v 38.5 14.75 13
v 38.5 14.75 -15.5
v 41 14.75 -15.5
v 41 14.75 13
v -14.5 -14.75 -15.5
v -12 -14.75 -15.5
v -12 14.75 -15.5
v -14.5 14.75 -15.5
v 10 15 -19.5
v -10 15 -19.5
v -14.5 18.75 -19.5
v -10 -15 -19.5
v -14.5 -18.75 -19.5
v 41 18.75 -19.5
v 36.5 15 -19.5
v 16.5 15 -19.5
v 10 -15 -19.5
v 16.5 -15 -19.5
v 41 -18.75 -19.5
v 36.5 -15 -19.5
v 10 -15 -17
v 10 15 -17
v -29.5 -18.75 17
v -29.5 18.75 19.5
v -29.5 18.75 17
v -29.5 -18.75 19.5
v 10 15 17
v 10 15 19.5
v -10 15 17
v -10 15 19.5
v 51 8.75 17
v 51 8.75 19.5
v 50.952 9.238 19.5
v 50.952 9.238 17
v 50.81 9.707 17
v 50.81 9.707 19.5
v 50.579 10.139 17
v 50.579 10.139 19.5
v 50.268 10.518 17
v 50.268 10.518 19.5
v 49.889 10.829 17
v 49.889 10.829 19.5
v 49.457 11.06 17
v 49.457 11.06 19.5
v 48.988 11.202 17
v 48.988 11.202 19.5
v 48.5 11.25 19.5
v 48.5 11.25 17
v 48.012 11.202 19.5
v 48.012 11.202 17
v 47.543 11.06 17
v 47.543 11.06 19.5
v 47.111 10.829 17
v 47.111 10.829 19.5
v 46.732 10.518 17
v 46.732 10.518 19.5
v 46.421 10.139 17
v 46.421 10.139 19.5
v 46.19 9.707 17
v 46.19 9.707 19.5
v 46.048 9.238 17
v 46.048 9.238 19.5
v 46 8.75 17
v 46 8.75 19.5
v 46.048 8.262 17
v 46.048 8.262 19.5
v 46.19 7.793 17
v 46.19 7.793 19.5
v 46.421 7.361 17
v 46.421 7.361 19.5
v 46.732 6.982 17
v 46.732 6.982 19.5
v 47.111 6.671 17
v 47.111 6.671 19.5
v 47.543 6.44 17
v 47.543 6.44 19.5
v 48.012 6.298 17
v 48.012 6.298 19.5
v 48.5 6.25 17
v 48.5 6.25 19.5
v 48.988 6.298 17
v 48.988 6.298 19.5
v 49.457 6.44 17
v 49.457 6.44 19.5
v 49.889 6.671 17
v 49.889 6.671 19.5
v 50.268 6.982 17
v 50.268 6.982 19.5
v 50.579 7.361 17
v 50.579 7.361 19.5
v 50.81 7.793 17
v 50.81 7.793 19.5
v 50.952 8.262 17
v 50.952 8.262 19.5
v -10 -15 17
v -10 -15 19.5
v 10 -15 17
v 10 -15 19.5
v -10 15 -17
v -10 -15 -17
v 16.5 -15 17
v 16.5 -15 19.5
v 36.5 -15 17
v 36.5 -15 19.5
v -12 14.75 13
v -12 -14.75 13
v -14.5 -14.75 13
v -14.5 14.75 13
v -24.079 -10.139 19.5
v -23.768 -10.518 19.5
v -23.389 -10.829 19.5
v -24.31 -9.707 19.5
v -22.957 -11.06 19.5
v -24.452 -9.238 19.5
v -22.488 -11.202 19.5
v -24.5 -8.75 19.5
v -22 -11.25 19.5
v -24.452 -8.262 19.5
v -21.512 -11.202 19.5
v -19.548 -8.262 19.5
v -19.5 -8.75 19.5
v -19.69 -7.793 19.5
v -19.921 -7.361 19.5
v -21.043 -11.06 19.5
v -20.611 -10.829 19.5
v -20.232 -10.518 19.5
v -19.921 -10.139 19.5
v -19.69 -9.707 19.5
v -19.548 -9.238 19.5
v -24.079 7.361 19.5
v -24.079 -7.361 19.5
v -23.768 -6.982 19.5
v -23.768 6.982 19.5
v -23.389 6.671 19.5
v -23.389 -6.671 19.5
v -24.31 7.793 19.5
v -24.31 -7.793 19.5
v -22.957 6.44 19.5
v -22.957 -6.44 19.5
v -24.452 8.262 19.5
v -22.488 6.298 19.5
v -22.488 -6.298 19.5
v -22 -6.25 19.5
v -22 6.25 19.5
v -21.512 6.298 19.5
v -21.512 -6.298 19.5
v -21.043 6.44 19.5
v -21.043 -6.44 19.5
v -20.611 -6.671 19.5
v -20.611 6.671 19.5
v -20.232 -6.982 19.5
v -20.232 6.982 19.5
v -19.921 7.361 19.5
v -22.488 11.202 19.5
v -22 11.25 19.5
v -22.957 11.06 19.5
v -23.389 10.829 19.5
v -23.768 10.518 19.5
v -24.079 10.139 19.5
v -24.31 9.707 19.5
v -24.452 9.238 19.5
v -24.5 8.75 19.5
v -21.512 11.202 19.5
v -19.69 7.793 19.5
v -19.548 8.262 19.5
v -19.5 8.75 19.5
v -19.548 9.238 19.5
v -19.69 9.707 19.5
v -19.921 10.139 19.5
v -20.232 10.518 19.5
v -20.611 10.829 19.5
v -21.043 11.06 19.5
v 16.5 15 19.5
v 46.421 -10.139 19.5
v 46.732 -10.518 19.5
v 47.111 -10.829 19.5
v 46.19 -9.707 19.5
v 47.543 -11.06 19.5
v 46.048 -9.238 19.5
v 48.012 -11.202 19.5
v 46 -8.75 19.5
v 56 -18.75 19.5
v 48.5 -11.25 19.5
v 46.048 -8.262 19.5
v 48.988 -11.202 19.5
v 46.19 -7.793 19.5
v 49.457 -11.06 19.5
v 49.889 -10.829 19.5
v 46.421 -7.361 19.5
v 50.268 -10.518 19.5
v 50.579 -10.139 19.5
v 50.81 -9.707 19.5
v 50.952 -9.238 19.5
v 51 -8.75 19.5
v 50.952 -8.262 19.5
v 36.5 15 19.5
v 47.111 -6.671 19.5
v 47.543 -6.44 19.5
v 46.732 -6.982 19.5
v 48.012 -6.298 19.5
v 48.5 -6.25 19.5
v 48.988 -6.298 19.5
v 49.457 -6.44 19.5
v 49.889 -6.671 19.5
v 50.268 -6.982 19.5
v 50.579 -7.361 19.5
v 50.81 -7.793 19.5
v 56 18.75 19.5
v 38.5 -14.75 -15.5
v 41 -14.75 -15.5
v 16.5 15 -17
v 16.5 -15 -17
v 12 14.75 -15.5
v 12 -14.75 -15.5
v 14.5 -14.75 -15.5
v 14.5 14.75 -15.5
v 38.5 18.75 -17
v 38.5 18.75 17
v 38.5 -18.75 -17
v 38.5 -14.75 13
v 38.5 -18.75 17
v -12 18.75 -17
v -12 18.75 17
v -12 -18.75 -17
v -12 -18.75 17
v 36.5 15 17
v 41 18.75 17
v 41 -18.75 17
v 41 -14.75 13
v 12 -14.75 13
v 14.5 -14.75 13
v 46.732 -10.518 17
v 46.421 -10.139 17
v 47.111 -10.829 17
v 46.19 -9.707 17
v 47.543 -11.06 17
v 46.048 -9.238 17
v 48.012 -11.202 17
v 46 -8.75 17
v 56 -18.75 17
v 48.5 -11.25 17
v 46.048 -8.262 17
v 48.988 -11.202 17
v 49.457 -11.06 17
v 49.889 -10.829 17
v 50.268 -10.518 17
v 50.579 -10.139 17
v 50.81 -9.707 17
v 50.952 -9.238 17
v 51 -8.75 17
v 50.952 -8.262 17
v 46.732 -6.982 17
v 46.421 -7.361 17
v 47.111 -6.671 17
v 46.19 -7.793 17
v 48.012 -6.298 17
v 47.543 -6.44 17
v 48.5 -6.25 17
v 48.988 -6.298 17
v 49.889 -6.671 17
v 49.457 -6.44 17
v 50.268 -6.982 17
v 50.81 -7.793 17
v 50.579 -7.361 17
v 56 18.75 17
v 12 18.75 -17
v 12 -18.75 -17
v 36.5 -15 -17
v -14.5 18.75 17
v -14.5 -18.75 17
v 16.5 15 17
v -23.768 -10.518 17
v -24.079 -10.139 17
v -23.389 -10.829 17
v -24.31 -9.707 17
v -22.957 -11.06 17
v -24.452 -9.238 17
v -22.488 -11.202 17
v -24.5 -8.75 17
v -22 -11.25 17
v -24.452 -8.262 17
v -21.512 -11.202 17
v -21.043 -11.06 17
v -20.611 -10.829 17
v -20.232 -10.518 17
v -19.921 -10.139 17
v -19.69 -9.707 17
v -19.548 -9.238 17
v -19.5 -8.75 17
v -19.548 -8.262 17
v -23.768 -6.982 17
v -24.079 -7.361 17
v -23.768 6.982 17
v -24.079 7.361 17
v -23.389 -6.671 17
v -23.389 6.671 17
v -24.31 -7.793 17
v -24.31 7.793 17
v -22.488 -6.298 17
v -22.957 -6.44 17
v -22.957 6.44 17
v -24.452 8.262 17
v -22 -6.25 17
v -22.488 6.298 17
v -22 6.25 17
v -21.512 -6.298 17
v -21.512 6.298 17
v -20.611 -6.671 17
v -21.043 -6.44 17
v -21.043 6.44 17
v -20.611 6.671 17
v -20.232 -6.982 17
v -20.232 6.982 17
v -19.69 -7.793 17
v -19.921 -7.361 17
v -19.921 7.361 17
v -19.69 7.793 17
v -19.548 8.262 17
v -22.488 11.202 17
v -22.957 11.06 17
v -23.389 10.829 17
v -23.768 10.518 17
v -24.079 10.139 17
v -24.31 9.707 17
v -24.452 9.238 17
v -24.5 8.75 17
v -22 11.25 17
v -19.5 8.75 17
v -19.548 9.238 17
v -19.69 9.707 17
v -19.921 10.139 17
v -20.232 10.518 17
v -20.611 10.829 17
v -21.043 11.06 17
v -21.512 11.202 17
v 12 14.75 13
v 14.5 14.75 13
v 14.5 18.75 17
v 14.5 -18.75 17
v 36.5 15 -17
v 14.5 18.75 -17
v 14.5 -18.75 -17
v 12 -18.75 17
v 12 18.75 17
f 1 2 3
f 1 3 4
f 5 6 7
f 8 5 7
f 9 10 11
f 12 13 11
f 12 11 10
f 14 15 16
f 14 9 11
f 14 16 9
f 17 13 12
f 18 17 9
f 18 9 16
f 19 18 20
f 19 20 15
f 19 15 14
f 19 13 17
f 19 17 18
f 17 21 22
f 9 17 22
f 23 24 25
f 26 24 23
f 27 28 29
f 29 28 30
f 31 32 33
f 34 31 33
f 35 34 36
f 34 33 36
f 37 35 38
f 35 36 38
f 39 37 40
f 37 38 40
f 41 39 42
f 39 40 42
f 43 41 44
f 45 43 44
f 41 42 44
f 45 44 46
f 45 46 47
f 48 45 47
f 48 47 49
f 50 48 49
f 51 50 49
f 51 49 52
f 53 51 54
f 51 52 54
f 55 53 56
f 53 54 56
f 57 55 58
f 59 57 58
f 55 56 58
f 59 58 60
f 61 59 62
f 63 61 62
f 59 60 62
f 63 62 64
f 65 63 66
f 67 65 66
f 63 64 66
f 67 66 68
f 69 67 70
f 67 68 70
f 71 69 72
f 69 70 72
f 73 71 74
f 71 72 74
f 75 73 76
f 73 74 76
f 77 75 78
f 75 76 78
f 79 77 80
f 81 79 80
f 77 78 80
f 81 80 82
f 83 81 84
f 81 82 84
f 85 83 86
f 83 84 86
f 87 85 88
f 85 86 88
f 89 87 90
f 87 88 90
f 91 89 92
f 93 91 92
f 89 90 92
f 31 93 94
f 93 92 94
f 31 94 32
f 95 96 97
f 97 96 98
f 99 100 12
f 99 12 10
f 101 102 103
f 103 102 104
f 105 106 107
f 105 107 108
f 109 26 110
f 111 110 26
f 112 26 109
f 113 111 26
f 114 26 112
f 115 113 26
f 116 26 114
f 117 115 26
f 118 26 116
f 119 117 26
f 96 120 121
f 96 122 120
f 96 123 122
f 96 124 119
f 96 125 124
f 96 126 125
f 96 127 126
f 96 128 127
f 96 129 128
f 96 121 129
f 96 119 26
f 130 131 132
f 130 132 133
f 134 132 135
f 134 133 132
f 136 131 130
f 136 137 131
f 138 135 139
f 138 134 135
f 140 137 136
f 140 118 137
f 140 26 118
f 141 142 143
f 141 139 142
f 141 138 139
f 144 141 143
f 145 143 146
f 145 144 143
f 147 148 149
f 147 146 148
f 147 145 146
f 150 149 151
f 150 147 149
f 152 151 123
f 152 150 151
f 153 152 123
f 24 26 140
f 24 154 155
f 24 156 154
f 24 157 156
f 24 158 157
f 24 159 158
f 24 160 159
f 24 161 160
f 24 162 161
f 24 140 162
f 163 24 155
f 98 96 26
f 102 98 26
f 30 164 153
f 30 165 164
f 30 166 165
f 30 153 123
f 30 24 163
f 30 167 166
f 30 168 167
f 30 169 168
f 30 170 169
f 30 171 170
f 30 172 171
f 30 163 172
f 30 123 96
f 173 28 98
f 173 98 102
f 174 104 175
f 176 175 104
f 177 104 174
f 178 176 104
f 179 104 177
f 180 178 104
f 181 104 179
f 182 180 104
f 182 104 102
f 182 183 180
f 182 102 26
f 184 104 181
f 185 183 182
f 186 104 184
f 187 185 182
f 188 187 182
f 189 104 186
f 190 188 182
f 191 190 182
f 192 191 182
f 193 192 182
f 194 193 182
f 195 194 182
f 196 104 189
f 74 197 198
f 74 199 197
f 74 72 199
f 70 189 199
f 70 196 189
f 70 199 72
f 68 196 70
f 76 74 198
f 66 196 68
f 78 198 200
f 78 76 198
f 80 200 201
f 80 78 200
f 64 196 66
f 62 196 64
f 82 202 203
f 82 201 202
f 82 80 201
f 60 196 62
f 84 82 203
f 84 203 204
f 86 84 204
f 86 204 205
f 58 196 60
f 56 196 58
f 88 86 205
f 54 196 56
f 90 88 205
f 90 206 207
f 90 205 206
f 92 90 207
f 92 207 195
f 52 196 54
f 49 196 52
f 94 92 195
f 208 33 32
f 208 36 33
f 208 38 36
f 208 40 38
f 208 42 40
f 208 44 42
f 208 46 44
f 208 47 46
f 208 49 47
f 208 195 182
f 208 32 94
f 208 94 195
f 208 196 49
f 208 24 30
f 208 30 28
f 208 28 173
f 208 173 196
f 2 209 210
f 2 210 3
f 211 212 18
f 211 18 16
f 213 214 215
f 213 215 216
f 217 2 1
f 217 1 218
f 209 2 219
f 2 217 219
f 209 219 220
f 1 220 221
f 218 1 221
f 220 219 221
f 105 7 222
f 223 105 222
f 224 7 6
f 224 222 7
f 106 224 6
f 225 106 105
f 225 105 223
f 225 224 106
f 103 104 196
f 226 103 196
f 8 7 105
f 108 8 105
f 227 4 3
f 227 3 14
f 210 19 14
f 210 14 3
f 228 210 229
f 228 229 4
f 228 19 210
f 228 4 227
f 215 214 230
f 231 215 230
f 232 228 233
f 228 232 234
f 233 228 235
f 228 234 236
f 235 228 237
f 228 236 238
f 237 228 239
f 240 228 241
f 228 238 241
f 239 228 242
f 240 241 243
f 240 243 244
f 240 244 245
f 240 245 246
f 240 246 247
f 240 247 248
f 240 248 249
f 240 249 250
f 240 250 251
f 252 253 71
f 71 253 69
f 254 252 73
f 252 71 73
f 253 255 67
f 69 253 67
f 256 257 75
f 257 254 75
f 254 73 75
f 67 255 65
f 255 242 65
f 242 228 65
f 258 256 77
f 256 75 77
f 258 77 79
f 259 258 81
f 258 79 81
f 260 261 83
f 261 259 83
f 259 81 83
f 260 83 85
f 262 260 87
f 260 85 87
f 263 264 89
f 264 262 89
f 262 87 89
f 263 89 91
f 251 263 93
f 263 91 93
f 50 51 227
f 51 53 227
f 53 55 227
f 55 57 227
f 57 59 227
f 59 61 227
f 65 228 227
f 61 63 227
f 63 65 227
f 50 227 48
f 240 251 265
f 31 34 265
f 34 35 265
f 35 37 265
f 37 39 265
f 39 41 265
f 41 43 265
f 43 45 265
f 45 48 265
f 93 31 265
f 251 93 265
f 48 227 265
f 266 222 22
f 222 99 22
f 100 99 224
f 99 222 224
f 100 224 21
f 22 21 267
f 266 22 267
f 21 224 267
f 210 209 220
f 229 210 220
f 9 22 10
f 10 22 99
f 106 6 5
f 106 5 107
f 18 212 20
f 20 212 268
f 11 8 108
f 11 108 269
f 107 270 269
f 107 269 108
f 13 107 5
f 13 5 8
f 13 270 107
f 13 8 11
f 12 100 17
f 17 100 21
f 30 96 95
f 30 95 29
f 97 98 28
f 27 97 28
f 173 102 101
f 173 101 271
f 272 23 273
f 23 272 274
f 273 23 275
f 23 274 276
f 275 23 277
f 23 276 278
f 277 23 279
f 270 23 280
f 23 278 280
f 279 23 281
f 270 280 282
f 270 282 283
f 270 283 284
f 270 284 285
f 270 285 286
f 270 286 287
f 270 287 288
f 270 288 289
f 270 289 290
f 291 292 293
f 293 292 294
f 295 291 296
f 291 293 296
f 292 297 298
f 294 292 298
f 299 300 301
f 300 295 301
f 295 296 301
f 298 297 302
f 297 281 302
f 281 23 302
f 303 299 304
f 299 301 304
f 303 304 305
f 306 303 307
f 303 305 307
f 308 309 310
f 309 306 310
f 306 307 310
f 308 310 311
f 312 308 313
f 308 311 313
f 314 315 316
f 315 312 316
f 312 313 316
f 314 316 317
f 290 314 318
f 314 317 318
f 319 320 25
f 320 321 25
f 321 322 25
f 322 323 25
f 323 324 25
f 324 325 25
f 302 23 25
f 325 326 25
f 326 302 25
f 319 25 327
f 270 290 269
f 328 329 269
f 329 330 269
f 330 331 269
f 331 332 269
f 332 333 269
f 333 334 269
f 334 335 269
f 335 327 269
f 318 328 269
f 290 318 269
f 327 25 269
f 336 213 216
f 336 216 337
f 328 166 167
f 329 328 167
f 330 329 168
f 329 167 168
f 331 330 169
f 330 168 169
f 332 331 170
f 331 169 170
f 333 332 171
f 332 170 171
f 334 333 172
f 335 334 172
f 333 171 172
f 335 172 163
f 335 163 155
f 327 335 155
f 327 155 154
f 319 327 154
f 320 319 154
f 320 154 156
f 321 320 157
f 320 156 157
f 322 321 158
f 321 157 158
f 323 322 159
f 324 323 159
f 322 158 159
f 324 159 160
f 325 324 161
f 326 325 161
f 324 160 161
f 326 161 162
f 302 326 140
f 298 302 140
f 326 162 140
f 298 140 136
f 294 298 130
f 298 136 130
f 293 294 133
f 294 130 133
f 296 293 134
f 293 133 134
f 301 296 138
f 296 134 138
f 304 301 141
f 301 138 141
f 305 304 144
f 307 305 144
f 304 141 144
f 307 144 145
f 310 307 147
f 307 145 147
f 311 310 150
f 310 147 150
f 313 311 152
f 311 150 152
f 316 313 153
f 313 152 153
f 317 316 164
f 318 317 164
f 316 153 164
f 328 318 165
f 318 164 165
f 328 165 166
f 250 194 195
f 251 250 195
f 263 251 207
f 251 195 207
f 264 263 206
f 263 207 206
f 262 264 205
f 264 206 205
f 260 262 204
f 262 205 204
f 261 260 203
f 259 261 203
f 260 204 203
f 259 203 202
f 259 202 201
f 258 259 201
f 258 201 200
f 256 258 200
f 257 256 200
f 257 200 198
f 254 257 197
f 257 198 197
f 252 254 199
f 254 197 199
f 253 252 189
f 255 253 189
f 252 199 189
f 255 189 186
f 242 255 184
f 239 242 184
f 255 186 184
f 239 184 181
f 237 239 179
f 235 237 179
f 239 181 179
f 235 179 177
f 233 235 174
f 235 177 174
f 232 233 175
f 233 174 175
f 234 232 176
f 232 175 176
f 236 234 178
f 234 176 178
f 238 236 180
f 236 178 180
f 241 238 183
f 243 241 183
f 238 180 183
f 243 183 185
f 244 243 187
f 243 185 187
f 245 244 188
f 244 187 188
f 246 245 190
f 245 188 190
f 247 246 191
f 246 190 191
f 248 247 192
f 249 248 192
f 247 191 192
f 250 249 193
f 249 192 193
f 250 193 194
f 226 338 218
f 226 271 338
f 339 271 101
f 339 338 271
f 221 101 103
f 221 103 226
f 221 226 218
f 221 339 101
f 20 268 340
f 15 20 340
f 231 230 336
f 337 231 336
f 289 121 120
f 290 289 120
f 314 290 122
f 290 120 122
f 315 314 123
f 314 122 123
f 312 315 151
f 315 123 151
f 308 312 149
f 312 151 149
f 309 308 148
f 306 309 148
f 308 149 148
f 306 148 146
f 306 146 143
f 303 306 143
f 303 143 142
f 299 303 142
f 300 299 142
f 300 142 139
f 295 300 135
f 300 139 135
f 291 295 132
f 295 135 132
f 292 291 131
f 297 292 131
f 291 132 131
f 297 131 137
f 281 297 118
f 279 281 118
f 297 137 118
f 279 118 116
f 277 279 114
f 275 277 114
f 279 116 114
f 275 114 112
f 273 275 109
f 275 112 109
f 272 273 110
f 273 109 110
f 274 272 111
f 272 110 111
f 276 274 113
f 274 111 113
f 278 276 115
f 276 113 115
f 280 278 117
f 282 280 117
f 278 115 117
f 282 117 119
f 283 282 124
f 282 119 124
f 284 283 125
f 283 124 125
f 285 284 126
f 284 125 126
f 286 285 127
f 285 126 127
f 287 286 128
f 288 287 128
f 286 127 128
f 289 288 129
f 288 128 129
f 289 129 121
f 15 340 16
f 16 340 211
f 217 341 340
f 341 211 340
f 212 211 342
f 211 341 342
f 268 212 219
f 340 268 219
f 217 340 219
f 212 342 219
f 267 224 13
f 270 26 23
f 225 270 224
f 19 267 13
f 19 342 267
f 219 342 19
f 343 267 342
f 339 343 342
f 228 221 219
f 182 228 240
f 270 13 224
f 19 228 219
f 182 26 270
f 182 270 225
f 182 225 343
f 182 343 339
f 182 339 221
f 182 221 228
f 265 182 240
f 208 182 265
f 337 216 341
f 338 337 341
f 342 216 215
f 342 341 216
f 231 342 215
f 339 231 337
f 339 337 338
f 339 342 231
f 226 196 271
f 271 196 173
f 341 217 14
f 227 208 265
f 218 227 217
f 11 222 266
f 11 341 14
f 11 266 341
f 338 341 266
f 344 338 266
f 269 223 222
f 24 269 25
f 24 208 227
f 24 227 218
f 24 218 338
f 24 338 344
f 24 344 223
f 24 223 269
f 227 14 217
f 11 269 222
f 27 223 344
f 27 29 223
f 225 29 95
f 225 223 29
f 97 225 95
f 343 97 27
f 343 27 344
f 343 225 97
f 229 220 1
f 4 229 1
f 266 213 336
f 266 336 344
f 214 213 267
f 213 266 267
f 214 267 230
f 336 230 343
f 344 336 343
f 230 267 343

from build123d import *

# Parameters (mm, degrees)
F0_W          = 24
F0_H          = 34
F1_DEPTH      = 18.75
F1_DEPTH_BACK = 18.75
F2_R          = 2.5
F3_DEPTH      = 2.5
F2_W          = 6.75
F2_H          = 30
F2_W_2        = 13.25
F4_DEPTH      = 60
F5_W          = 29.5
F5_H          = 28.5
F6_DEPTH      = 76.15809
F6_DEPTH_BACK = 25


with BuildPart() as f1:
    # F0 (on Front) → F1 (new body, two sides)
    with BuildSketch(Plane.XZ) as f1_sk:
        Polygon((14.5, 19.5), (-14.5, 19.5), (-14.5, -19.5), (14.5, -19.5), (41, -19.5), (41, -17), (41, 17), (41, 19.5), align=None)
        Rectangle(F0_W, F0_H, mode=Mode.SUBTRACT)
        with Locations((26.5, 0)):
            Rectangle(F0_W, F0_H, mode=Mode.SUBTRACT)
    extrude(amount=F1_DEPTH)
    extrude(f1_sk.sketch, amount=-F1_DEPTH_BACK)

    # F2 (on face) → F3 (join)
    with BuildSketch(Plane.XY.offset(19.5)):
        Polygon((-29.5, 18.75), (-29.5, -18.75), (56, -18.75), (56, 18.75), (-14.5, 18.75), align=None)
        with Locations((-22, -8.75)):
            Circle(F2_R, mode=Mode.SUBTRACT)
        with Locations((48.5, -8.75)):
            Circle(F2_R, mode=Mode.SUBTRACT)
        with Locations((-22, 8.75)):
            Circle(F2_R, mode=Mode.SUBTRACT)
        Polygon((-10, -15), (-10, 15), (3.25, 15), (10, 15), (16.5, 15), (23.25, 15), (36.5, 15), (36.5, -15), (23.25, -15), (16.5, -15), (10, -15), (3.25, -15), align=None, mode=Mode.SUBTRACT)
        with Locations((48.5, 8.75)):
            Circle(F2_R, mode=Mode.SUBTRACT)
    extrude(amount=-F3_DEPTH)

    # F2 (on face) → F4 (cut)
    with BuildSketch(Plane.XY.offset(19.5)):
        with Locations((6.625, 0)):
            Rectangle(F2_W, F2_H)
        with Locations((-3.375, 0)):
            Rectangle(F2_W_2, F2_H)
        with Locations((19.875, 0)):
            Rectangle(F2_W, F2_H)
        with Locations((29.875, 0)):
            Rectangle(F2_W_2, F2_H)
    extrude(amount=-F4_DEPTH, mode=Mode.SUBTRACT)

    # F5 (on Right) → F6 (cut, two sides)
    with BuildSketch(Plane.YZ) as f6_sk:
        with Locations((0, -1.25)):
            Rectangle(F5_W, F5_H)
    extrude(amount=F6_DEPTH, mode=Mode.SUBTRACT)
    extrude(f6_sk.sketch, amount=-F6_DEPTH_BACK, mode=Mode.SUBTRACT)


solid = f1.part
